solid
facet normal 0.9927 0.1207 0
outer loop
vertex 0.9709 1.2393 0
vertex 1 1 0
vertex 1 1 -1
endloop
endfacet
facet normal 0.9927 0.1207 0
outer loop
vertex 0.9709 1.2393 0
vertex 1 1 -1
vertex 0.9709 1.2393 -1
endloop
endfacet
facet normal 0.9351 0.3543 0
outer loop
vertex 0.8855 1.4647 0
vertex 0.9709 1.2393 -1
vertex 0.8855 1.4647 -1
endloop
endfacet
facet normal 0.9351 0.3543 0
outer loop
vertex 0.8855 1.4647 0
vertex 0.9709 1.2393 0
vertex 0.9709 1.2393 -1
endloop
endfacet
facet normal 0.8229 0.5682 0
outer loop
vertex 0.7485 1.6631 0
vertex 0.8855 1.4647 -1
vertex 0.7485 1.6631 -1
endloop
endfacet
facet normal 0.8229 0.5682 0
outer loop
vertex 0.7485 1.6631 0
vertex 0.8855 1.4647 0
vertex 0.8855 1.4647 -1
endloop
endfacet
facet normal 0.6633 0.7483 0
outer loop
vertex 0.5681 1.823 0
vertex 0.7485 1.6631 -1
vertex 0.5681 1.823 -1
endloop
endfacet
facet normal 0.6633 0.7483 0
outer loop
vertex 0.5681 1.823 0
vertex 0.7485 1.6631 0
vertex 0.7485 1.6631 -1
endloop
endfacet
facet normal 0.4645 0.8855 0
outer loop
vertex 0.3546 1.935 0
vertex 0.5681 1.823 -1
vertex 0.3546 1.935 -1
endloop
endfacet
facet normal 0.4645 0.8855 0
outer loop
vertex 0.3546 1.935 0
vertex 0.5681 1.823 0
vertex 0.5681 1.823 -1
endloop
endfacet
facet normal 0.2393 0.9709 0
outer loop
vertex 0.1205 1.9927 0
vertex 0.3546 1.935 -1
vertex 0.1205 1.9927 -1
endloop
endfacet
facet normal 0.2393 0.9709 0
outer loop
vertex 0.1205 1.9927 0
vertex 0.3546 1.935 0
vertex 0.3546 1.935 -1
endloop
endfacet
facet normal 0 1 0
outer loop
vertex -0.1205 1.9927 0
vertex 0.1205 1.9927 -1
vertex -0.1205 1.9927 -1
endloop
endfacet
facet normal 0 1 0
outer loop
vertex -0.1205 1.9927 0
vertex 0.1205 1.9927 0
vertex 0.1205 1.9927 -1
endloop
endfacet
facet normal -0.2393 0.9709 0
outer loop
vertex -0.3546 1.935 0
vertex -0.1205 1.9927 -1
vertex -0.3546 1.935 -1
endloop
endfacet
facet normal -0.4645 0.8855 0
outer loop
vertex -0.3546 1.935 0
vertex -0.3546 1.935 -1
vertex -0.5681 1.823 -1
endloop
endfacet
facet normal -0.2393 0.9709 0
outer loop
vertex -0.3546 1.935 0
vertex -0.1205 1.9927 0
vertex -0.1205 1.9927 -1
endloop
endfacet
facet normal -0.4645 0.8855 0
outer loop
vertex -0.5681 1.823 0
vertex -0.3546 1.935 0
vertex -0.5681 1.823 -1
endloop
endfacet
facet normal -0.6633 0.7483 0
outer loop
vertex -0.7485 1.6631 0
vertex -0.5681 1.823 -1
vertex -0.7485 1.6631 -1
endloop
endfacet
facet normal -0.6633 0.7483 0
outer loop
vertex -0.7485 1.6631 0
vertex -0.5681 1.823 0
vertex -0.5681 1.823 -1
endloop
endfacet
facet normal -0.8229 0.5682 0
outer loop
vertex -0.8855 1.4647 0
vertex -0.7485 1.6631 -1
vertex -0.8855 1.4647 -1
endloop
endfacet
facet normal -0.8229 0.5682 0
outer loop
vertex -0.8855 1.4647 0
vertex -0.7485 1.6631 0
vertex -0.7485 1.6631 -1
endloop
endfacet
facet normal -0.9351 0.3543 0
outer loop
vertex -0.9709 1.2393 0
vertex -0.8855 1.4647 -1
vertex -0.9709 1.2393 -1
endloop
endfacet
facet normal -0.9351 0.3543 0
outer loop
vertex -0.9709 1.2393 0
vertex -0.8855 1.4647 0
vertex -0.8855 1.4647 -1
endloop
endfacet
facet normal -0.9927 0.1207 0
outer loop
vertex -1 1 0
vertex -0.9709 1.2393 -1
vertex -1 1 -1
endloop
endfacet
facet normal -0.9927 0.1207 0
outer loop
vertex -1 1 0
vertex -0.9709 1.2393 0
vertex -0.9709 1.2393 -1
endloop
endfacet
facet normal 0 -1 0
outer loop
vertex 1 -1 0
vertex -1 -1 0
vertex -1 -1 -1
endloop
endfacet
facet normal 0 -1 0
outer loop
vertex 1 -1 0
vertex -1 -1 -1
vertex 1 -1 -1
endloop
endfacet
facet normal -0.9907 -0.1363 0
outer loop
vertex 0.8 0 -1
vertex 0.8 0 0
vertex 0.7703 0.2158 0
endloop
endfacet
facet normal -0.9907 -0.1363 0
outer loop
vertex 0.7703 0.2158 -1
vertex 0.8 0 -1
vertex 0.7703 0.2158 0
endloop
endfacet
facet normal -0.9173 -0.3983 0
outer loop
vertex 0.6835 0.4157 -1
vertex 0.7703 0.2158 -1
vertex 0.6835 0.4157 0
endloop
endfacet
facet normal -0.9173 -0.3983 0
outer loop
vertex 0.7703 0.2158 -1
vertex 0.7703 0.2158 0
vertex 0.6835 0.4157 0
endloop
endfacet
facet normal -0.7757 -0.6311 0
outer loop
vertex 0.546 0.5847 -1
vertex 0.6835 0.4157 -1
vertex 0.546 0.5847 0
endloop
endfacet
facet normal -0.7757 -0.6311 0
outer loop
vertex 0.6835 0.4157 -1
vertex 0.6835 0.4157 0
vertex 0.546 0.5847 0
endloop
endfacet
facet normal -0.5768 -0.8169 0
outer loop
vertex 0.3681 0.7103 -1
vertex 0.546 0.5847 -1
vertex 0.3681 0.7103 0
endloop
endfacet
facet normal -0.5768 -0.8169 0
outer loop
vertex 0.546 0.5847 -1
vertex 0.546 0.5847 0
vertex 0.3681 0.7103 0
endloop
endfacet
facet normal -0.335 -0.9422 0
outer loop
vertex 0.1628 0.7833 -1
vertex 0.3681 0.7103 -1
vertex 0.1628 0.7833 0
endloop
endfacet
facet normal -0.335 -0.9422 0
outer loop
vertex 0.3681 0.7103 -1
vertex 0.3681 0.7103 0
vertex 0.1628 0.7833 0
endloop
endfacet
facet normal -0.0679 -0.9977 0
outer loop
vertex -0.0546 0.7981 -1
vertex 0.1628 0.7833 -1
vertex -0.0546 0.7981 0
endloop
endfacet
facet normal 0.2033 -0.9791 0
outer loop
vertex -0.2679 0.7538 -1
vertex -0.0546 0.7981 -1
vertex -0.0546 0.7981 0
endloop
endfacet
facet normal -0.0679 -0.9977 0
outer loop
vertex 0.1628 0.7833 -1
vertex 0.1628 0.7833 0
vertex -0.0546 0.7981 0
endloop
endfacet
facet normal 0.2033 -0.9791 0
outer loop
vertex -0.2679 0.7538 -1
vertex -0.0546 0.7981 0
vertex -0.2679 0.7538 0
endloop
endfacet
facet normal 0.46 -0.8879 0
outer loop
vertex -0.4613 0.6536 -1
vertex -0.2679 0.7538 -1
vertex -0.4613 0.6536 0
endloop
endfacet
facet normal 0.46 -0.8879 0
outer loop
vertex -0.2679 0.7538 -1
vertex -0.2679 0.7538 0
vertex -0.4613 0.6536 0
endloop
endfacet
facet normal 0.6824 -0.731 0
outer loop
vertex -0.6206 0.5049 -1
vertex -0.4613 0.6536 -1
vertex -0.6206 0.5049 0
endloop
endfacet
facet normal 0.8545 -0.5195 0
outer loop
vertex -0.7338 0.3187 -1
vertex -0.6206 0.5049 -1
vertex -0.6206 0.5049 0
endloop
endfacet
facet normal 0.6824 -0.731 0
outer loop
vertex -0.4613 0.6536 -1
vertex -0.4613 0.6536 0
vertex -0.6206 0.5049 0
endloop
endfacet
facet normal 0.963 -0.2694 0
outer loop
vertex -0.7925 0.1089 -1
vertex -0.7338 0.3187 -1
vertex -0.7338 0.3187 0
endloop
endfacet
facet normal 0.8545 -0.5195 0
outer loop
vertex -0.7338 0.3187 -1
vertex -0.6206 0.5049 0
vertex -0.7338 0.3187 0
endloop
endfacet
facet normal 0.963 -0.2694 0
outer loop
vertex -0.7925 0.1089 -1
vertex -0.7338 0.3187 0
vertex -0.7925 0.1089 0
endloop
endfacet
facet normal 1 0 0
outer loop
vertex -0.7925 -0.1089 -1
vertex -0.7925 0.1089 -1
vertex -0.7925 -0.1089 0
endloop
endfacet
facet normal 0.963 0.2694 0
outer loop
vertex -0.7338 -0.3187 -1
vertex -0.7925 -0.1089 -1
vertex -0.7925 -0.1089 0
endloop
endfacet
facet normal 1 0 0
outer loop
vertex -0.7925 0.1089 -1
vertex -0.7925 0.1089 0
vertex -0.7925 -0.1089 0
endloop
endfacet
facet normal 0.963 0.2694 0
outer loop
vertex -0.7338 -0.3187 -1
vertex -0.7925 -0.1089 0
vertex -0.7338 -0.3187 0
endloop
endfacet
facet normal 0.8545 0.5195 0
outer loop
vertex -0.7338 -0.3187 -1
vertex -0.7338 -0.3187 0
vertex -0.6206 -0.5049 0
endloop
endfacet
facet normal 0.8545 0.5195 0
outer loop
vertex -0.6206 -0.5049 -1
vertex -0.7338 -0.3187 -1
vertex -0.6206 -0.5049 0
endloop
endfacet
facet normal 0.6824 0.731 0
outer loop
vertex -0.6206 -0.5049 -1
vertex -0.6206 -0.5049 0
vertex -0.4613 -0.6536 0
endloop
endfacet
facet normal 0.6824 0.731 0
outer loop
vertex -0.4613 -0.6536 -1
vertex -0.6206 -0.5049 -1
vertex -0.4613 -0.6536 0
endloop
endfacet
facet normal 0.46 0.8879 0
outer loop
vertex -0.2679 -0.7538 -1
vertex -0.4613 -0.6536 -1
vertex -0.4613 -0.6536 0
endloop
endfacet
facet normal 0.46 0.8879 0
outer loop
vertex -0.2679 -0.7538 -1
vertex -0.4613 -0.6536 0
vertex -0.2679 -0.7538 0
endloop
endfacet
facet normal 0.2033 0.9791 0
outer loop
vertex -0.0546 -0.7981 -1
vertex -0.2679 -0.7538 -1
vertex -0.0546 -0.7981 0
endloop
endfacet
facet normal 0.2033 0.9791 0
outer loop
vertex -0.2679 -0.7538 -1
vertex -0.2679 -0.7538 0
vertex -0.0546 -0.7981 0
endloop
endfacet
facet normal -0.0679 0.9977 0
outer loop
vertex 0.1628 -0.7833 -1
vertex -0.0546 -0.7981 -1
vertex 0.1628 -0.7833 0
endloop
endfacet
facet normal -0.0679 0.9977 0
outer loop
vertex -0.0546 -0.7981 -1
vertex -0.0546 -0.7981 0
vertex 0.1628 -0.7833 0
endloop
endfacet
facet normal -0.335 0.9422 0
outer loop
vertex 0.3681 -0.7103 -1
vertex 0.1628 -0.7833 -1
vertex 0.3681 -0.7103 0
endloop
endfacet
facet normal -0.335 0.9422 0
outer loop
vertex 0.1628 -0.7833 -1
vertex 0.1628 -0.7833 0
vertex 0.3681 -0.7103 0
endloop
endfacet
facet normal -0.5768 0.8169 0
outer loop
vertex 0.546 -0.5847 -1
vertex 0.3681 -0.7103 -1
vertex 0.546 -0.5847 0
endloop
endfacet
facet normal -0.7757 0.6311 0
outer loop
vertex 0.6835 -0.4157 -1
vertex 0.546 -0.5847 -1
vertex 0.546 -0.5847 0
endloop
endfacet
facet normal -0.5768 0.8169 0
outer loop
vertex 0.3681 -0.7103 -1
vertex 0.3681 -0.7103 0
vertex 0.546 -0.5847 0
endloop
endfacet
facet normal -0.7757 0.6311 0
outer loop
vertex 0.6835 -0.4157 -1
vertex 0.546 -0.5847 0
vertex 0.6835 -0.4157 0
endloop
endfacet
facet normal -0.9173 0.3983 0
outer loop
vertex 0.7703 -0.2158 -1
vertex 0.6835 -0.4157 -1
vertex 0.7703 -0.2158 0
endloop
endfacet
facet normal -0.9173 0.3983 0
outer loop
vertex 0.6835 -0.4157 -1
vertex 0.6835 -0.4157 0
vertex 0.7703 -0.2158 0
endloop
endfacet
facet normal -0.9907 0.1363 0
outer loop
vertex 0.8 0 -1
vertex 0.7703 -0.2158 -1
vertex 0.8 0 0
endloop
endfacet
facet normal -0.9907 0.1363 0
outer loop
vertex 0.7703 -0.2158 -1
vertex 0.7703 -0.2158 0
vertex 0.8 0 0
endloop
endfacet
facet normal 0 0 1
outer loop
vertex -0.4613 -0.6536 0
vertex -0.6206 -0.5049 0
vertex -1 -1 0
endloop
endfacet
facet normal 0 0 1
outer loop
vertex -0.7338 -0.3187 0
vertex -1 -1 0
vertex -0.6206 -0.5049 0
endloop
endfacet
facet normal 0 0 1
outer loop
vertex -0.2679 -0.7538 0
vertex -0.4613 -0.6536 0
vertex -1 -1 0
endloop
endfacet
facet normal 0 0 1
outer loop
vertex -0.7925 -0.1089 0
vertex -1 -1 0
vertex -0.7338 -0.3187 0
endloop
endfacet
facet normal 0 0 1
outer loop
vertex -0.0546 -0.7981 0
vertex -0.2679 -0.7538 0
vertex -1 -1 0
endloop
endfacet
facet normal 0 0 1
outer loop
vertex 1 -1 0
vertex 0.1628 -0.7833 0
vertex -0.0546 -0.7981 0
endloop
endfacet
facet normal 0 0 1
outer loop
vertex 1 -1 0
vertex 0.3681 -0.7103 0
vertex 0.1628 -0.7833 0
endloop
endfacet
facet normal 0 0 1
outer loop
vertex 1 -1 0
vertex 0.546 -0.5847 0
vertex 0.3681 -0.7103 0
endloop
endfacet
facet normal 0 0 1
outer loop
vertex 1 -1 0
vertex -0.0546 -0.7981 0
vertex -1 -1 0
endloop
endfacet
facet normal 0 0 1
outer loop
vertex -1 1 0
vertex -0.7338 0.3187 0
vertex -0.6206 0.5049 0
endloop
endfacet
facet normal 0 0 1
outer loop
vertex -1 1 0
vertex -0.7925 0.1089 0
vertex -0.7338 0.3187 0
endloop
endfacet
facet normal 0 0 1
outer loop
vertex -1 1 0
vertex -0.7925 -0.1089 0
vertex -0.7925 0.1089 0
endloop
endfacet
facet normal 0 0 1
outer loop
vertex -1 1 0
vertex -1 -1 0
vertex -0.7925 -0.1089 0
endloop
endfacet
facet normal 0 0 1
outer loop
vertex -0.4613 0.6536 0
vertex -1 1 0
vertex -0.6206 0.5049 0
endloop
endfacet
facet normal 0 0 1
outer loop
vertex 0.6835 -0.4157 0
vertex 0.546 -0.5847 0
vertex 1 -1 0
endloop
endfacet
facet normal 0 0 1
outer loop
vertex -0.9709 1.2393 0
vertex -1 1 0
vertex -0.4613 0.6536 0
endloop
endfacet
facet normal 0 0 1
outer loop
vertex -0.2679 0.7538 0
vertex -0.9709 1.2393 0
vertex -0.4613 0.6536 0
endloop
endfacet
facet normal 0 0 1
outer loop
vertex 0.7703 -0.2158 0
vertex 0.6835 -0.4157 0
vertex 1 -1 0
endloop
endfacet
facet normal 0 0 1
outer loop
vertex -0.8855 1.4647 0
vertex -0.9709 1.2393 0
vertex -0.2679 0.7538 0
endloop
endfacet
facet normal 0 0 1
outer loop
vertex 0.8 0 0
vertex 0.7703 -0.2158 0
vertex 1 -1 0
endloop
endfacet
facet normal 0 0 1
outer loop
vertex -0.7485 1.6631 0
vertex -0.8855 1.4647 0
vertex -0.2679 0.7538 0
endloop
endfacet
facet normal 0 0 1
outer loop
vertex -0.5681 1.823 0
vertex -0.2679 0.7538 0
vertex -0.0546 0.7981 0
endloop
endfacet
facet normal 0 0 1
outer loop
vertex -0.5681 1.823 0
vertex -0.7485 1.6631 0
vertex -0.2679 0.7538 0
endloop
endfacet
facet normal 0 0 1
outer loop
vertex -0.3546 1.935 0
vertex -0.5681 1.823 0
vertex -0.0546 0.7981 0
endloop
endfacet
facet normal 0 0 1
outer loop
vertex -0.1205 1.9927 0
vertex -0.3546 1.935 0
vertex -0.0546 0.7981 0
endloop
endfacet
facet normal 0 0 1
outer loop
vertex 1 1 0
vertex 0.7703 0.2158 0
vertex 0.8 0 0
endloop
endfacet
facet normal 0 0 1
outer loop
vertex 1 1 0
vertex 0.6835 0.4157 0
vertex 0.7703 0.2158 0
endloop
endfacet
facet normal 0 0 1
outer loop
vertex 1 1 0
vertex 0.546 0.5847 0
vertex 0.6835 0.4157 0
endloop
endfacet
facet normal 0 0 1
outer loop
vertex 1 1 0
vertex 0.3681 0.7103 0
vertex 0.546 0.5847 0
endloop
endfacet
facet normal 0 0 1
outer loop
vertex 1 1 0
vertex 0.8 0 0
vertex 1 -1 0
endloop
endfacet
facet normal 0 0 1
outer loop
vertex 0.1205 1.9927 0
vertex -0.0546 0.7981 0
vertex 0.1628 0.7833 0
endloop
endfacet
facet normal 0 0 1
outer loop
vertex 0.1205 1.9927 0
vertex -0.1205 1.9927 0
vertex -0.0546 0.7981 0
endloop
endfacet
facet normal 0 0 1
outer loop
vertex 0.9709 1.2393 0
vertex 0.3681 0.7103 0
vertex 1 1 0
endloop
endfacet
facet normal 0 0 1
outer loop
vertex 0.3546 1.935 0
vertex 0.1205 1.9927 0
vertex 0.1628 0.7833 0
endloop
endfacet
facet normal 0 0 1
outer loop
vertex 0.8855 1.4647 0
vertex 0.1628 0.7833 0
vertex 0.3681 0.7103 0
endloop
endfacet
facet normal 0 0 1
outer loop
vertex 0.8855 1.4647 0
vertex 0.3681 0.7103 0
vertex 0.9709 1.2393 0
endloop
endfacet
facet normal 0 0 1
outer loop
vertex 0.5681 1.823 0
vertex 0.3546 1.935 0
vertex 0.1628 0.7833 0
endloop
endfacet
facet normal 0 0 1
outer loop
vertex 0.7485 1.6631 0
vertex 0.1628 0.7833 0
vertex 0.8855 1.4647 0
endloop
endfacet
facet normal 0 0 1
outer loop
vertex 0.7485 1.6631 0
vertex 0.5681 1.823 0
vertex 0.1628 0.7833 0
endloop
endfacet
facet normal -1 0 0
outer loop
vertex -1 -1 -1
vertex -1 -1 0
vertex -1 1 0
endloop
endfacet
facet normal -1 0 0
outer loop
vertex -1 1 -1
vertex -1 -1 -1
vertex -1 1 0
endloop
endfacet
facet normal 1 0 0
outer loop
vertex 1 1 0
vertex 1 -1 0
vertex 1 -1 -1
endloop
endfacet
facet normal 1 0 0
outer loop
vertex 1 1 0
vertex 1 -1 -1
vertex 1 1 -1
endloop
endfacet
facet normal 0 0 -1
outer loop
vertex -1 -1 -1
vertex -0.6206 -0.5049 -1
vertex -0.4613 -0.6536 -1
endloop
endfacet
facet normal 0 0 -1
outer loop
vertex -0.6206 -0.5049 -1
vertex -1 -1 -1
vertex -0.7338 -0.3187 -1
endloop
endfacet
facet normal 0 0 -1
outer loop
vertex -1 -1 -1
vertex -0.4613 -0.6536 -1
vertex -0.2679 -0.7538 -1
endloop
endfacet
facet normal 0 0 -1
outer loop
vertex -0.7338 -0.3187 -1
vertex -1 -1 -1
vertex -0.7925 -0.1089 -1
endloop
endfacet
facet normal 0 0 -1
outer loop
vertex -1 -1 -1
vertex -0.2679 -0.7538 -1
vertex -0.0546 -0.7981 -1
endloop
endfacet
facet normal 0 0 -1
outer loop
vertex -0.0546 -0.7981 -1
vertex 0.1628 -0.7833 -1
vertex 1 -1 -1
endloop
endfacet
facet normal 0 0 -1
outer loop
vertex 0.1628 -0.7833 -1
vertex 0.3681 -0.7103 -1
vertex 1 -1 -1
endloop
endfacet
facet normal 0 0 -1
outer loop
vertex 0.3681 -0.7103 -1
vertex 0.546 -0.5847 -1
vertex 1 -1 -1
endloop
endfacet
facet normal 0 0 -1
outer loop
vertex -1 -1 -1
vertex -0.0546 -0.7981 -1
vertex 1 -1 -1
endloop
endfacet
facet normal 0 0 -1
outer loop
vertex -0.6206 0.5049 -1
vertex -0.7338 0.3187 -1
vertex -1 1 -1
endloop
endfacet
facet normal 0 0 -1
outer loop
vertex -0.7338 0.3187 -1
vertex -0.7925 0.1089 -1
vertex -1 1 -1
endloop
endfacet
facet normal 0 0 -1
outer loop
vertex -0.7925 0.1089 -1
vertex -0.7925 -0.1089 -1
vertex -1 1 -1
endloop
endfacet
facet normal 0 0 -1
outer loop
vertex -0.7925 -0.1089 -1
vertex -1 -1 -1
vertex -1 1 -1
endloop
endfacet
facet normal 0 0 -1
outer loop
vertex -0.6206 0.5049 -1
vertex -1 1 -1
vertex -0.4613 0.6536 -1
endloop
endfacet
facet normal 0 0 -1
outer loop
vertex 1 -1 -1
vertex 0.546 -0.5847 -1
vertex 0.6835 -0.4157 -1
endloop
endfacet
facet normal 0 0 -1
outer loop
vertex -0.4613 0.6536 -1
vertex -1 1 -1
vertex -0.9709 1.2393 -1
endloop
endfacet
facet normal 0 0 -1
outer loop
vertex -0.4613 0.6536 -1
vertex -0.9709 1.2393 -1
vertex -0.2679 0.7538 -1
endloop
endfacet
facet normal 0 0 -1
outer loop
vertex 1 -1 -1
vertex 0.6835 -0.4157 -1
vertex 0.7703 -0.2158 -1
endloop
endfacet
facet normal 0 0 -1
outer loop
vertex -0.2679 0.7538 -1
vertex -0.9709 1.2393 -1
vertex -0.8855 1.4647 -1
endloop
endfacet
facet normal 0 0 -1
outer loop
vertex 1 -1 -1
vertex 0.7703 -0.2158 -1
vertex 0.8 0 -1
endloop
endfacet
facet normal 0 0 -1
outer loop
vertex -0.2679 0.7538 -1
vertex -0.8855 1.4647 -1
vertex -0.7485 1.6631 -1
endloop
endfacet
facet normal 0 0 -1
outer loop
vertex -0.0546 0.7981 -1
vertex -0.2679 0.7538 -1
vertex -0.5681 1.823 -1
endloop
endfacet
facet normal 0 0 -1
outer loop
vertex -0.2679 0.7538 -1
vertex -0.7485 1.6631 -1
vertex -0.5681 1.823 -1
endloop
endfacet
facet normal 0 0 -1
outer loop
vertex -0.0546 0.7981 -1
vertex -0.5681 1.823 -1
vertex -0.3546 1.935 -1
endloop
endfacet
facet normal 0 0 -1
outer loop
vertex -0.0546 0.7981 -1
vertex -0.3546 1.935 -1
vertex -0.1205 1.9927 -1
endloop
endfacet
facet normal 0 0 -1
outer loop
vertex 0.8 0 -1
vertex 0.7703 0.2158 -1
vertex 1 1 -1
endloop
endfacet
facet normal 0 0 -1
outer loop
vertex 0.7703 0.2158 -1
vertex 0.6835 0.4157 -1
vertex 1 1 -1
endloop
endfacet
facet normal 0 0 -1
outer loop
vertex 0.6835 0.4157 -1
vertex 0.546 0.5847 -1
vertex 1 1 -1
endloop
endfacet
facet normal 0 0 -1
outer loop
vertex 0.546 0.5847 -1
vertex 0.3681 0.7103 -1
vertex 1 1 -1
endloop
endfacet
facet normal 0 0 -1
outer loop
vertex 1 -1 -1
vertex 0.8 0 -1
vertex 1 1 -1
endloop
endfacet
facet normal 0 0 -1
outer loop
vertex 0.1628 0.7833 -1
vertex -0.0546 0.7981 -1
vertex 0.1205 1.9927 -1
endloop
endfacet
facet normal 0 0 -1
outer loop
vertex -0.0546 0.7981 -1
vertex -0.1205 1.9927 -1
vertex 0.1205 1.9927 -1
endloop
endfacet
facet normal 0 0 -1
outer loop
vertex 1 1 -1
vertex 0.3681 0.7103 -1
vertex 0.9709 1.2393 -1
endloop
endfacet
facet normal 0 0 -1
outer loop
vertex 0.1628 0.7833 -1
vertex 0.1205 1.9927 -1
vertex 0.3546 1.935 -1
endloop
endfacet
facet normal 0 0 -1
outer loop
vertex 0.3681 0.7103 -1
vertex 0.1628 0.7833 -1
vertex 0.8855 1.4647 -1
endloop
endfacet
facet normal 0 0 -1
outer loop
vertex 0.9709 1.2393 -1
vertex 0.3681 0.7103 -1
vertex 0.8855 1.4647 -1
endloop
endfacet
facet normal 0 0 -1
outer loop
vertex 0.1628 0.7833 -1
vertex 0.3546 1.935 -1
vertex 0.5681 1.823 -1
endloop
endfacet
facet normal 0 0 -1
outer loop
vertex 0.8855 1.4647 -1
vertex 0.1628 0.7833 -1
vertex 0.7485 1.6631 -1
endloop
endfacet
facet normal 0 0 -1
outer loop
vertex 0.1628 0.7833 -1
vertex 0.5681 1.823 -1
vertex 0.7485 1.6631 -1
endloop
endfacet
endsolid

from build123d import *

# Parameters (mm, degrees)
SKETCH2_W           = 2
SKETCH2_H           = 2
BOSS_EXTRUDE1_DEPTH = 1
SKETCH3_R           = 1
BOSS_EXTRUDE2_DEPTH = 1
SKETCH1_R           = 0.8
CUT_EXTRUDE1_DEPTH  = 1


with BuildPart() as part:
    # Sketch2 → Boss-Extrude1 (new body)
    with BuildSketch(Plane.XY):
        Rectangle(SKETCH2_W, SKETCH2_H)
    extrude(amount=-BOSS_EXTRUDE1_DEPTH)

    # Sketch3 → Boss-Extrude2 (add)
    with BuildSketch(Plane.XY):
        with Locations((0, 1)):
            Circle(SKETCH3_R)
    extrude(amount=-BOSS_EXTRUDE2_DEPTH)

    # Sketch1 → Cut-Extrude1 (cut)
    with BuildSketch(Plane.XY):
        Circle(SKETCH1_R)
    extrude(amount=-CUT_EXTRUDE1_DEPTH, mode=Mode.SUBTRACT)


solid = part.part
